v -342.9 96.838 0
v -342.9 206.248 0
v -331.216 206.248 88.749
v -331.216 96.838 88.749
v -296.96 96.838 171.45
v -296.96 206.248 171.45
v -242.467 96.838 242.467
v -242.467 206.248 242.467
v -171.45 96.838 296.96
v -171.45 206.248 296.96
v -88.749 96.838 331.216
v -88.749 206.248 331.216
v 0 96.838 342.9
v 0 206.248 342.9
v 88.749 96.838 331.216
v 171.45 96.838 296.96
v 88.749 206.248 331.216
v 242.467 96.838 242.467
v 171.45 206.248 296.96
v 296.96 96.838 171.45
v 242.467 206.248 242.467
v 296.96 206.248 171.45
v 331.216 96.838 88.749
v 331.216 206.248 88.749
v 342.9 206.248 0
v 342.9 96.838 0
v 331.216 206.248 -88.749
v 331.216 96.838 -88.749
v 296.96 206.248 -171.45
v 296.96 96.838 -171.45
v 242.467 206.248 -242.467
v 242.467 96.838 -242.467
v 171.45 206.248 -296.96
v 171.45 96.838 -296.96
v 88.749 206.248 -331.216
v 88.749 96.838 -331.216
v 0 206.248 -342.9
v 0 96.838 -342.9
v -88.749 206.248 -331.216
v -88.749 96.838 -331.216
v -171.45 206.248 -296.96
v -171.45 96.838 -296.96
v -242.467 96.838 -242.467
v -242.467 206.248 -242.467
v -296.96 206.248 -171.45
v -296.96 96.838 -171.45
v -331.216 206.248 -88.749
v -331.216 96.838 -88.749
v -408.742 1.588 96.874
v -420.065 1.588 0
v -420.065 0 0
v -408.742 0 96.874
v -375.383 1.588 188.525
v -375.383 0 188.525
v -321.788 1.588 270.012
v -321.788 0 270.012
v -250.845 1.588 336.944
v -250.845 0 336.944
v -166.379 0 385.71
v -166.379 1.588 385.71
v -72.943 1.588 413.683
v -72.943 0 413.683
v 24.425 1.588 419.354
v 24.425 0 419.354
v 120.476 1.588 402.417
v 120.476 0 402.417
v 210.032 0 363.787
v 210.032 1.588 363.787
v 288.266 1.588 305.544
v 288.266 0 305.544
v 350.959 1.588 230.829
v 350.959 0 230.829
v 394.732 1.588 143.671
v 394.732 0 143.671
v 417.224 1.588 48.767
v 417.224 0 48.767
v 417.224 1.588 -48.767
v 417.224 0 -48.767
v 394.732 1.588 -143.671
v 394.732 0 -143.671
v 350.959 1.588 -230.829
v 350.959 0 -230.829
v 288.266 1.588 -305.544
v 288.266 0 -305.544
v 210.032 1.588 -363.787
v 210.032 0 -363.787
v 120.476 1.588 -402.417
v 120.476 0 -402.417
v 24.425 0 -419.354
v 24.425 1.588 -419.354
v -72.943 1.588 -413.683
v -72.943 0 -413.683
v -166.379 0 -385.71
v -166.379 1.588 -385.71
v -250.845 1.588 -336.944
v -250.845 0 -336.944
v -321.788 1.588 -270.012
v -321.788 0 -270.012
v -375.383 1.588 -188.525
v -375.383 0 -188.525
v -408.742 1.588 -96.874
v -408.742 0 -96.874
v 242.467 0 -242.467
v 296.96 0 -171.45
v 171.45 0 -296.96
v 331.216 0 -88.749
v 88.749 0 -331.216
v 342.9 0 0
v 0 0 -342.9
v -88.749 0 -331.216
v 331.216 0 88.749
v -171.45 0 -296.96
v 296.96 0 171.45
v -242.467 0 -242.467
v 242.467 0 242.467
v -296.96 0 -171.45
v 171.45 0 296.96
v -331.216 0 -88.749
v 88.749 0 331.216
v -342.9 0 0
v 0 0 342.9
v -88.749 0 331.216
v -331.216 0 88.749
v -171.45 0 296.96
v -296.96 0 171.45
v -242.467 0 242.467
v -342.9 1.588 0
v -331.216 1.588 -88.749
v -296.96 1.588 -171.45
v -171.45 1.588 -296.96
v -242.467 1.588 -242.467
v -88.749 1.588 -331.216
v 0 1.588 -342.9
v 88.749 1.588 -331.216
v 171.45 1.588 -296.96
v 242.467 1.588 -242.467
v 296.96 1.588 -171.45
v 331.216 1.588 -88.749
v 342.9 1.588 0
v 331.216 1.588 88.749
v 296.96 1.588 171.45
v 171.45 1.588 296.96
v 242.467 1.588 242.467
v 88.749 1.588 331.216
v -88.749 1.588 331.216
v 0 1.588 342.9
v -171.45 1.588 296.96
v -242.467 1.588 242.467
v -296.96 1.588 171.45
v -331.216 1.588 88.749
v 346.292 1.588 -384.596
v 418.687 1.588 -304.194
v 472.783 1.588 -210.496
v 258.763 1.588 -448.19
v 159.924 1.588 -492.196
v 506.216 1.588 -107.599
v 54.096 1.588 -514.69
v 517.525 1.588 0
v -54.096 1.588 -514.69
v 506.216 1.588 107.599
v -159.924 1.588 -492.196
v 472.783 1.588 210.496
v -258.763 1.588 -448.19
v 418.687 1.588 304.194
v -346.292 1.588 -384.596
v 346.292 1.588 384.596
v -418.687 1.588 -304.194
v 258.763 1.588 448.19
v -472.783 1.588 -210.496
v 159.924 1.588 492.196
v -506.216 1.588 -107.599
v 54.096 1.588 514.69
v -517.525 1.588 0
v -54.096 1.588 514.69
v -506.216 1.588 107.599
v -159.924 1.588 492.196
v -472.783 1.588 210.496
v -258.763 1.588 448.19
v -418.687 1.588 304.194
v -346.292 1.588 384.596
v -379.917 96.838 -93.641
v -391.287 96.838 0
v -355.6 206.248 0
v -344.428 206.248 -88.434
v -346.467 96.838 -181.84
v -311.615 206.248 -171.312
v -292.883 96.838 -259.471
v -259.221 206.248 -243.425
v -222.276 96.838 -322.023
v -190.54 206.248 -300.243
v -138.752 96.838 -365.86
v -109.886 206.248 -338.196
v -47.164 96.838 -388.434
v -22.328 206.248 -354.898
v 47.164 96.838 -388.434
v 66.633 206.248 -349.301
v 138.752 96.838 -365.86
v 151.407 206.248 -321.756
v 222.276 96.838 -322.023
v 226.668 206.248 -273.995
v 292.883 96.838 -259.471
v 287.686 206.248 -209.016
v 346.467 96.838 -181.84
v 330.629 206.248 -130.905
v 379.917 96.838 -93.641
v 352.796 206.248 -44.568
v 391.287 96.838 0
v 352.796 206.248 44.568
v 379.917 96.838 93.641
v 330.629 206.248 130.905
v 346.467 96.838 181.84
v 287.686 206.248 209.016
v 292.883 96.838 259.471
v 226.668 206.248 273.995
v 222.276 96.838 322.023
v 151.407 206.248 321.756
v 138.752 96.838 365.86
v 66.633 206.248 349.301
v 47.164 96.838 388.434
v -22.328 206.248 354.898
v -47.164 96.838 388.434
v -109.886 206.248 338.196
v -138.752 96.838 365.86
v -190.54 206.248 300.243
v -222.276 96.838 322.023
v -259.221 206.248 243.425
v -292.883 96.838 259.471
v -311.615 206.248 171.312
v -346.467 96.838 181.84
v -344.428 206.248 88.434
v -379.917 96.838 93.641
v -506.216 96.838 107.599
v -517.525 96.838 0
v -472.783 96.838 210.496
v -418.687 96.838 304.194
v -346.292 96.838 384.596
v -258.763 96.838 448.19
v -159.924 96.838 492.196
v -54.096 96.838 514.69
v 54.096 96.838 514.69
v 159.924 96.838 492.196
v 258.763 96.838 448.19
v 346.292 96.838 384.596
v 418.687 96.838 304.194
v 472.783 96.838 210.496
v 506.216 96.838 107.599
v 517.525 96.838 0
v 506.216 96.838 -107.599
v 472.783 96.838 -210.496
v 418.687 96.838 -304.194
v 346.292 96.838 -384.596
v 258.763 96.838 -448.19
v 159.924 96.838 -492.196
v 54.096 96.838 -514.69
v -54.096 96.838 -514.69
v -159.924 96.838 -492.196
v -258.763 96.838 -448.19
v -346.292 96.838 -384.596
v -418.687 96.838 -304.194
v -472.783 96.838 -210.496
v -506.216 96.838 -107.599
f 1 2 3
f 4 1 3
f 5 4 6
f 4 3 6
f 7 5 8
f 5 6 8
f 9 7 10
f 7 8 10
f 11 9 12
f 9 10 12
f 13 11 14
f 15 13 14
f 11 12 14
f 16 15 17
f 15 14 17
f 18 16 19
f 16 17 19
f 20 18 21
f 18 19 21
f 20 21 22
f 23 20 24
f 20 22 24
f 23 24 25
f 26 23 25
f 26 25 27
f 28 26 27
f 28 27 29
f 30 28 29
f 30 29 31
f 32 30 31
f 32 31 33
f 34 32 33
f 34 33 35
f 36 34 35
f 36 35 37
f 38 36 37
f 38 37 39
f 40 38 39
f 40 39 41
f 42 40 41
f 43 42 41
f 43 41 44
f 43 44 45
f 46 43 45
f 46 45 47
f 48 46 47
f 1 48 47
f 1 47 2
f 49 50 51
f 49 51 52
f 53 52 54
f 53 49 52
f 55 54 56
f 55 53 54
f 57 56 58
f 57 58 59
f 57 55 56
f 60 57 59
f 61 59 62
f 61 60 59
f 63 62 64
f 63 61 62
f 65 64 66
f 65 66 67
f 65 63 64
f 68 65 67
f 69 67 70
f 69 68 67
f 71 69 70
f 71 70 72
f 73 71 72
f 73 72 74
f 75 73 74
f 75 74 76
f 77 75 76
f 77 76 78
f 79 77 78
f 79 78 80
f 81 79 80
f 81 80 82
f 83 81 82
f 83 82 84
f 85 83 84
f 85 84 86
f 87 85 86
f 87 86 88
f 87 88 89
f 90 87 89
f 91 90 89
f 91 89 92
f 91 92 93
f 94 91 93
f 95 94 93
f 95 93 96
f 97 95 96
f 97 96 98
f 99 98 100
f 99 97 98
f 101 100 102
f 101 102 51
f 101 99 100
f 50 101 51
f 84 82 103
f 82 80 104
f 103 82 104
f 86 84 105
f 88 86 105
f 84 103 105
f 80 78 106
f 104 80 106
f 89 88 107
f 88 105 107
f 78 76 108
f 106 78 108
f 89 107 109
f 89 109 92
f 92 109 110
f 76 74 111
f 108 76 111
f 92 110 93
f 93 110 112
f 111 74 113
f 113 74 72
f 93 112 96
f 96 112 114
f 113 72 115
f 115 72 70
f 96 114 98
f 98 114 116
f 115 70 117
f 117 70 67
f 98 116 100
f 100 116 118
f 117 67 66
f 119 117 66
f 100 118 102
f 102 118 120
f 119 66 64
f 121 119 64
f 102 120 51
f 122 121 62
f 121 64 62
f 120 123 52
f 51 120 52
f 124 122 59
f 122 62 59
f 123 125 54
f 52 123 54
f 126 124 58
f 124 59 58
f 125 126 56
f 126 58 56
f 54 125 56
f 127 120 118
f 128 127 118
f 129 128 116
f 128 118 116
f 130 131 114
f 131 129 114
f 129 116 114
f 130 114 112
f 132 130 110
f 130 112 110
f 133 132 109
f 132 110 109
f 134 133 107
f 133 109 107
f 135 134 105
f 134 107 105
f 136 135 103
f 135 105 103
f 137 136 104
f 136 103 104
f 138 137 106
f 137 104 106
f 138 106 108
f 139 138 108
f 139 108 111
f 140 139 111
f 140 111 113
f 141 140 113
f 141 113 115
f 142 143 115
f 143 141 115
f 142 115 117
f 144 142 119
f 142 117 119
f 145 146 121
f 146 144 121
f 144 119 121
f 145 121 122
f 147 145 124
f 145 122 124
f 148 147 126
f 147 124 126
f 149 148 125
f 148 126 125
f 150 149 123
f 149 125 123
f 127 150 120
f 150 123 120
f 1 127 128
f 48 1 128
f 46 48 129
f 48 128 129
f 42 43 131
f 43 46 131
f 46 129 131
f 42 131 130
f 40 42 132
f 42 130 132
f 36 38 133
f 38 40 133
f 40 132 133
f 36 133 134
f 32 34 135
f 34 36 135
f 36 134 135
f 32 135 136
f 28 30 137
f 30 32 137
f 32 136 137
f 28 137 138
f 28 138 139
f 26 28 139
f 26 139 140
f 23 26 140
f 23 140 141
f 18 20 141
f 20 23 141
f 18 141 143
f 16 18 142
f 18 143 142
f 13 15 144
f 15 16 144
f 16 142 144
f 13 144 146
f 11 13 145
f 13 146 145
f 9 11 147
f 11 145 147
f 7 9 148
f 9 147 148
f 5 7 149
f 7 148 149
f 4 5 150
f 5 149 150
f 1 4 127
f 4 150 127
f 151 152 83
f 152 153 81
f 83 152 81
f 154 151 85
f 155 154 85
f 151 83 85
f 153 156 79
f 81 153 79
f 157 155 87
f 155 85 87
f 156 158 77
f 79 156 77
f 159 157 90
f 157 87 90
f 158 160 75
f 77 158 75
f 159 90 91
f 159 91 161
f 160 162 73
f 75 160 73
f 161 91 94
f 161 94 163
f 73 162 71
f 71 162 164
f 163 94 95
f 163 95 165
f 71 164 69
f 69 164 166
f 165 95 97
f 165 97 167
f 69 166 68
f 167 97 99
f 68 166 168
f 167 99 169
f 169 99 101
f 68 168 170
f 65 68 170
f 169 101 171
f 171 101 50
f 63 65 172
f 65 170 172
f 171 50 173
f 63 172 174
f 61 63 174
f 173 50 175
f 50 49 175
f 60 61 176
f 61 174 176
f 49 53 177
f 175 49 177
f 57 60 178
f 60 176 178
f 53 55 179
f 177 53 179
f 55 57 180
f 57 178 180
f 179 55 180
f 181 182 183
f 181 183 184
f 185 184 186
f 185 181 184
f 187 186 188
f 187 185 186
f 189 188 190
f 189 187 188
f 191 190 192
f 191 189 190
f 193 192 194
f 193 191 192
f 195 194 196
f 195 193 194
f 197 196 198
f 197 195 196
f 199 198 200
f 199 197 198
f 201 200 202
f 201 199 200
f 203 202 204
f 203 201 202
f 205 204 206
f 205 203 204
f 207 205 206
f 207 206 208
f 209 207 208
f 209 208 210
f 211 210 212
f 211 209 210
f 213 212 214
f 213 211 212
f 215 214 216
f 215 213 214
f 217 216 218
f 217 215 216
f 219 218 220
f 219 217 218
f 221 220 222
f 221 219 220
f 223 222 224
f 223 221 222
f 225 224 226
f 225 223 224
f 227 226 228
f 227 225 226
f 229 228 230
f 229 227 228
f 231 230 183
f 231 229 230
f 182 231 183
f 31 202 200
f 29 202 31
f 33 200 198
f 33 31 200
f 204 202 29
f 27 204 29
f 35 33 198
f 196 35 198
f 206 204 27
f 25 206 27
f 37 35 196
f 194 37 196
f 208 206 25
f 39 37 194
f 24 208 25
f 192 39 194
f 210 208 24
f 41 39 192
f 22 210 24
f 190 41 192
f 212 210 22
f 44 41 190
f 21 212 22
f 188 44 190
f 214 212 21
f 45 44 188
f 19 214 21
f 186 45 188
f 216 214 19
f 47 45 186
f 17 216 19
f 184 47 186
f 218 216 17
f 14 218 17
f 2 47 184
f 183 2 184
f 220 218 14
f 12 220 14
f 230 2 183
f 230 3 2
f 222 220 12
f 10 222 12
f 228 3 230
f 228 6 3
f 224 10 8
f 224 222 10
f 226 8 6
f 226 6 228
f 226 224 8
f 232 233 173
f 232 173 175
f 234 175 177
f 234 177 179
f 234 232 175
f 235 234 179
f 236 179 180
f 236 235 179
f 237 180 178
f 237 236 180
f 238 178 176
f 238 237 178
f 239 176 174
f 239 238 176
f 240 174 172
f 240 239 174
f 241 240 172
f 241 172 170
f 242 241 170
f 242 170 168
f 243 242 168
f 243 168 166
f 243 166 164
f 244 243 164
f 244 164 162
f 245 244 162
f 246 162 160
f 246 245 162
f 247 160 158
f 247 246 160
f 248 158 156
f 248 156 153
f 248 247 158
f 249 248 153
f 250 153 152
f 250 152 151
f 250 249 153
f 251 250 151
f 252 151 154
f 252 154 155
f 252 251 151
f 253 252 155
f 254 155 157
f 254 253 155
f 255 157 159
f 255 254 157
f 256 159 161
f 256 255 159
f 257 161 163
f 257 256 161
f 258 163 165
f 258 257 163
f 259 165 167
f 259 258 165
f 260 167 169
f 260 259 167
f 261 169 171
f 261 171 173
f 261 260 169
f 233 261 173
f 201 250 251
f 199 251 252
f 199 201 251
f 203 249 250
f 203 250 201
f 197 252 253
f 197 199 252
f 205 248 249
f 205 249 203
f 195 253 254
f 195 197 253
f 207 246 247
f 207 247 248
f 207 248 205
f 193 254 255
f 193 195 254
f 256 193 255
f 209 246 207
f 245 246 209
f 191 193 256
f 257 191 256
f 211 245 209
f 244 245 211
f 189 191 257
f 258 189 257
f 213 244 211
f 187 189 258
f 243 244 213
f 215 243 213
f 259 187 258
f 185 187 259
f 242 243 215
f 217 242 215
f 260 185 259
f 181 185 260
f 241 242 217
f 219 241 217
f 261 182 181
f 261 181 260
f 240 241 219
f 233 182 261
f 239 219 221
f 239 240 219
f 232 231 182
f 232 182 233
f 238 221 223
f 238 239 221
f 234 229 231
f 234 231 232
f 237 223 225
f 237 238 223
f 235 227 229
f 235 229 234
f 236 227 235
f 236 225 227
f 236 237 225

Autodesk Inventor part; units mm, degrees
ref_plane "YZ Plane" through (0, 0, 0) normal (1, 0, 0) x (0, 1, 0)
ref_plane "XZ Plane" through (0, 0, 0) normal (0, 1, 0) x (-1, 0, 0)
ref_plane "XY Plane" through (0, 0, 0) normal (0, 0, 1) x (1, 0, 0)
sketch "Sketch1" plane through (0, 0, 0) normal (0, 0, 1) x (1, 0, 0)
  line L0 (0, 0) -> (0, 460.0937) construction
  line L1 (-342.9, 0) -> (-420.0646, 0)
  line L2 (-420.0646, 0) -> (-420.0646, 1.5875)
  line L3 (-420.0646, 1.5875) -> (-342.9, 1.5875)
  line L4 (-342.9, 1.5875) -> (-342.9, 0)
  line L5 (-342.9, 1.5875) -> (-517.525, 1.5875)
  line L6 (-517.525, 1.5875) -> (-517.525, 96.8375)
  line L7 (-517.525, 96.8375) -> (-342.9, 96.8375)
  line L8 (-342.9, 96.8375) -> (-342.9, 1.5875)
  line L9 (-342.9, 96.8375) -> (-342.9, 206.248)
  line L10 (-342.9, 206.248) -> (-355.6, 206.248)
  line L11 (-355.6, 206.248) -> (-391.287, 96.8375)
  dimension "d0" = 342.9
  dimension "d2" = 95.25
  dimension "d3" = 1.5875
  dimension "d4" = 517.525
  dimension "d5" = 206.248
  dimension "d6" = 391.287
  dimension "d7" = 355.6
revolve "Revolution1" add sketch "Sketch1" angle 360 about axis through (0, 0, 0) along (0, 1, 0)
properties part number "A1-19037-100-XX 28in CL300 Slip on Flange"
